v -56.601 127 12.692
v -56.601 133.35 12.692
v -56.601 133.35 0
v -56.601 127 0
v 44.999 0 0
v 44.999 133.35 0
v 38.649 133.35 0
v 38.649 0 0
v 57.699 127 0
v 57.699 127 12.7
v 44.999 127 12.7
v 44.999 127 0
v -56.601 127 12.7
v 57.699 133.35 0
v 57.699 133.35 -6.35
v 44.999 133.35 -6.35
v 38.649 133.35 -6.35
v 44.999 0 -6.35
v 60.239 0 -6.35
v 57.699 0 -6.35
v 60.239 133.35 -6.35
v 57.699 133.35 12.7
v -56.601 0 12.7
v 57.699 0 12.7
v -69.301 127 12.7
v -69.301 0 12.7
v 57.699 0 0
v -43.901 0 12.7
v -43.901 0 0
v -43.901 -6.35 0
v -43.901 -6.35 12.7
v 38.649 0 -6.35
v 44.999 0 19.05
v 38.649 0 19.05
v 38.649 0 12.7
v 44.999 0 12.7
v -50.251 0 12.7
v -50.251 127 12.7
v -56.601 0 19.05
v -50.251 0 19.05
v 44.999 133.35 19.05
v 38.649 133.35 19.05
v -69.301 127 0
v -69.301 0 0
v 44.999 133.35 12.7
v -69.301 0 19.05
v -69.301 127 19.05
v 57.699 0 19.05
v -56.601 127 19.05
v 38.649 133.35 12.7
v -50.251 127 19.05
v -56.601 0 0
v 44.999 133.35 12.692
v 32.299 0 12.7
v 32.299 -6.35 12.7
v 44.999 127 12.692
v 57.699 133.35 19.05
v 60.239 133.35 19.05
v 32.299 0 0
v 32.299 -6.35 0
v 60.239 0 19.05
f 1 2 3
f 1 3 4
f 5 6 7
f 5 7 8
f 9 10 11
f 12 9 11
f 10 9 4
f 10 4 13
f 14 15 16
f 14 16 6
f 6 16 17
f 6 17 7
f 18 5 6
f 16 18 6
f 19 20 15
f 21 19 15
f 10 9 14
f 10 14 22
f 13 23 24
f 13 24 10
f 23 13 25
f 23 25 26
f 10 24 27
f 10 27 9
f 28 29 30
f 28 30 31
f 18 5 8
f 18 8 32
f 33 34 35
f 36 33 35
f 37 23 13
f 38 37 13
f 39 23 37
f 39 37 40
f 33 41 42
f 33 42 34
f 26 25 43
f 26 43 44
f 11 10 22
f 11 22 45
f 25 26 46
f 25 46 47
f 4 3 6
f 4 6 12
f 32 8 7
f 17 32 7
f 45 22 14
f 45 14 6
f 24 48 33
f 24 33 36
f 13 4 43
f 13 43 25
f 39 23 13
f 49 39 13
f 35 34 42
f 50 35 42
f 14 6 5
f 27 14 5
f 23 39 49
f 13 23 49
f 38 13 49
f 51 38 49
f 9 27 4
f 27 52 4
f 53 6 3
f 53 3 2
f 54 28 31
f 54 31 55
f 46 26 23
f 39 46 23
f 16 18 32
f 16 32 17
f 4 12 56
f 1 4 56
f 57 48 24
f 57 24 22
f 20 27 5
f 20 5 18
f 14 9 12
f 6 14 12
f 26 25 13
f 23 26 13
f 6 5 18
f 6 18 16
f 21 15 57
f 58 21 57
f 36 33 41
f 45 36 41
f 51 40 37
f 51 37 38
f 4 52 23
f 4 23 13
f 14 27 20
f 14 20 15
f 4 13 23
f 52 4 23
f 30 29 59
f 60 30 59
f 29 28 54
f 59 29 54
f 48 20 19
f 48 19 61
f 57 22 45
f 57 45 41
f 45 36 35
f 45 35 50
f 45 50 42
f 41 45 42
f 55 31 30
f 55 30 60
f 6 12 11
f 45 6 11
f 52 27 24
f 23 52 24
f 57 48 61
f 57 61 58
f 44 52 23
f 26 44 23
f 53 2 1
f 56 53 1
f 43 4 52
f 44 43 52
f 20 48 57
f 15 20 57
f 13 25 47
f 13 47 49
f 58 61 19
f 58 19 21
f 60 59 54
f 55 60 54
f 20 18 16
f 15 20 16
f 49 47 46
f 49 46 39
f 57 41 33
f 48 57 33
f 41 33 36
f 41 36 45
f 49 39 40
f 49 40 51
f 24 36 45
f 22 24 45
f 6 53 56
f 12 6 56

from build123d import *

# Parameters (mm, degrees)
F0_W      = 101.6
F0_H      = 127
F1_DEPTH  = 12.7
F2_W      = 76.2
F2_H      = 12.7
F3_DEPTH  = 6.35
F6_DEPTH  = 6.35
F4_W      = 127
F4_H      = 12.7
F7_DEPTH  = 12.7
F8_DEPTH  = 6.35
F9_DEPTH  = 12.7
F10_W     = 133.35
F10_H     = 25.4
F11_DEPTH = 2.54
F12_W     = 12.7
F12_H     = 12.7
F13_DEPTH = 6.35
F14_W     = 6.35
F14_H     = 12.6919811592
F15_DEPTH = 101.6
F16_W     = 127
F16_H     = 12.7
F17_DEPTH = 12.7
F18_W     = 12.7
F18_H     = 127
F19_DEPTH = 6.35
F20_W     = 127
F20_H     = 6.35
F21_DEPTH = 6.35


with BuildPart() as f1:
    # F0 (on Top) → F1 (new body)
    with BuildSketch(Plane.XY):
        with Locations((-5.8006451845, 63.5)):
            Rectangle(F0_W, F0_H)
    extrude(amount=F1_DEPTH)

    # F4 (on face) → F7 (join)
    with BuildSketch(Plane.YZ.offset(44.9993548155)):
        with Locations((63.5, 6.35)):
            Rectangle(F4_W, F4_H)
    extrude(amount=F7_DEPTH)


with BuildPart() as f3:
    # F2 (on face) → F3 (new body)
    with BuildSketch(Plane.XZ):
        with Locations((-5.8006451845, 6.35)):
            Rectangle(F2_W, F2_H)
    extrude(amount=F3_DEPTH)


with BuildPart() as f6:
    # F5 (on face) → F6 (new body)
    with BuildSketch(Plane.YZ.offset(44.9993548155)):
        Polygon((0, 19.05), (0, 12.7), (127, 12.7), (133.35, 12.7), (133.35, 19.05), align=None)
    extrude(amount=-F6_DEPTH)


with BuildPart() as f8:
    # F5 (on face) → F8 (new body)
    with BuildSketch(Plane.YZ.offset(44.9993548155)):
        Polygon((127, 0), (0, 0), (0, -6.35), (133.35, -6.35), (133.35, 0), align=None)
    extrude(amount=-F8_DEPTH)


with BuildPart() as f9:
    # F5 (on face) → F9 (new body)
    with BuildSketch(Plane.YZ.offset(44.9993548155)):
        Polygon((127, 0), (0, 0), (0, -6.35), (133.35, -6.35), (133.35, 0), align=None)
    extrude(amount=F9_DEPTH)


with BuildPart() as f9b:
    # F5 (on face) → F9, piece 2 (new body)
    with BuildSketch(Plane.YZ.offset(44.9993548155)):
        Polygon((0, 19.05), (0, 12.7), (127, 12.7), (133.35, 12.7), (133.35, 19.05), align=None)
    extrude(amount=F9_DEPTH)


with BuildPart() as f11:
    # F10 (on face) → F11 (new body)
    with BuildSketch(Plane.YZ.offset(57.6993548155)):
        with Locations((66.675, 6.3499511823)):
            Rectangle(F10_W, F10_H)
    extrude(amount=F11_DEPTH)


with BuildPart() as f13:
    # F12 (on face) → F13 (new body)
    with BuildSketch(Plane(origin=(0, 127, 0), x_dir=(-1, 0, 0), z_dir=(0, 1, 0))):
        with Locations((-51.3493548155, 6.35)):
            Rectangle(F12_W, F12_H)
    extrude(amount=F13_DEPTH)


with BuildPart() as f15:
    # F14 (on face) → F15 (new body)
    with BuildSketch(Plane(origin=(-56.6006451845, 0, 0), x_dir=(0, -1, 0), z_dir=(-1, 0, 0))):
        with Locations((-130.175, 6.3459905796)):
            Rectangle(F14_W, F14_H)
    extrude(amount=-F15_DEPTH)


with BuildPart() as f17:
    # F16 (on face) → F17 (new body)
    with BuildSketch(Plane(origin=(-56.6006451845, 0, 0), x_dir=(0, -1, 0), z_dir=(-1, 0, 0))):
        with Locations((-63.5, 6.35)):
            Rectangle(F16_W, F16_H)
    extrude(amount=F17_DEPTH)


with BuildPart() as f19:
    # F18 (on face) → F19 (new body)
    with BuildSketch(Plane.XY.offset(12.7)):
        with Locations((-62.9506451845, 63.5)):
            Rectangle(F18_W, F18_H)
    extrude(amount=F19_DEPTH)


with BuildPart() as f21:
    # F20 (on face) → F21 (new body)
    with BuildSketch(Plane.YZ.offset(-56.6006451845)):
        with Locations((63.5, 15.875)):
            Rectangle(F20_W, F20_H)
    extrude(amount=F21_DEPTH)


solid = Compound([f1.part, f3.part, f6.part, f8.part, f9.part, f9b.part, f11.part, f13.part, f15.part, f17.part, f19.part, f21.part])
